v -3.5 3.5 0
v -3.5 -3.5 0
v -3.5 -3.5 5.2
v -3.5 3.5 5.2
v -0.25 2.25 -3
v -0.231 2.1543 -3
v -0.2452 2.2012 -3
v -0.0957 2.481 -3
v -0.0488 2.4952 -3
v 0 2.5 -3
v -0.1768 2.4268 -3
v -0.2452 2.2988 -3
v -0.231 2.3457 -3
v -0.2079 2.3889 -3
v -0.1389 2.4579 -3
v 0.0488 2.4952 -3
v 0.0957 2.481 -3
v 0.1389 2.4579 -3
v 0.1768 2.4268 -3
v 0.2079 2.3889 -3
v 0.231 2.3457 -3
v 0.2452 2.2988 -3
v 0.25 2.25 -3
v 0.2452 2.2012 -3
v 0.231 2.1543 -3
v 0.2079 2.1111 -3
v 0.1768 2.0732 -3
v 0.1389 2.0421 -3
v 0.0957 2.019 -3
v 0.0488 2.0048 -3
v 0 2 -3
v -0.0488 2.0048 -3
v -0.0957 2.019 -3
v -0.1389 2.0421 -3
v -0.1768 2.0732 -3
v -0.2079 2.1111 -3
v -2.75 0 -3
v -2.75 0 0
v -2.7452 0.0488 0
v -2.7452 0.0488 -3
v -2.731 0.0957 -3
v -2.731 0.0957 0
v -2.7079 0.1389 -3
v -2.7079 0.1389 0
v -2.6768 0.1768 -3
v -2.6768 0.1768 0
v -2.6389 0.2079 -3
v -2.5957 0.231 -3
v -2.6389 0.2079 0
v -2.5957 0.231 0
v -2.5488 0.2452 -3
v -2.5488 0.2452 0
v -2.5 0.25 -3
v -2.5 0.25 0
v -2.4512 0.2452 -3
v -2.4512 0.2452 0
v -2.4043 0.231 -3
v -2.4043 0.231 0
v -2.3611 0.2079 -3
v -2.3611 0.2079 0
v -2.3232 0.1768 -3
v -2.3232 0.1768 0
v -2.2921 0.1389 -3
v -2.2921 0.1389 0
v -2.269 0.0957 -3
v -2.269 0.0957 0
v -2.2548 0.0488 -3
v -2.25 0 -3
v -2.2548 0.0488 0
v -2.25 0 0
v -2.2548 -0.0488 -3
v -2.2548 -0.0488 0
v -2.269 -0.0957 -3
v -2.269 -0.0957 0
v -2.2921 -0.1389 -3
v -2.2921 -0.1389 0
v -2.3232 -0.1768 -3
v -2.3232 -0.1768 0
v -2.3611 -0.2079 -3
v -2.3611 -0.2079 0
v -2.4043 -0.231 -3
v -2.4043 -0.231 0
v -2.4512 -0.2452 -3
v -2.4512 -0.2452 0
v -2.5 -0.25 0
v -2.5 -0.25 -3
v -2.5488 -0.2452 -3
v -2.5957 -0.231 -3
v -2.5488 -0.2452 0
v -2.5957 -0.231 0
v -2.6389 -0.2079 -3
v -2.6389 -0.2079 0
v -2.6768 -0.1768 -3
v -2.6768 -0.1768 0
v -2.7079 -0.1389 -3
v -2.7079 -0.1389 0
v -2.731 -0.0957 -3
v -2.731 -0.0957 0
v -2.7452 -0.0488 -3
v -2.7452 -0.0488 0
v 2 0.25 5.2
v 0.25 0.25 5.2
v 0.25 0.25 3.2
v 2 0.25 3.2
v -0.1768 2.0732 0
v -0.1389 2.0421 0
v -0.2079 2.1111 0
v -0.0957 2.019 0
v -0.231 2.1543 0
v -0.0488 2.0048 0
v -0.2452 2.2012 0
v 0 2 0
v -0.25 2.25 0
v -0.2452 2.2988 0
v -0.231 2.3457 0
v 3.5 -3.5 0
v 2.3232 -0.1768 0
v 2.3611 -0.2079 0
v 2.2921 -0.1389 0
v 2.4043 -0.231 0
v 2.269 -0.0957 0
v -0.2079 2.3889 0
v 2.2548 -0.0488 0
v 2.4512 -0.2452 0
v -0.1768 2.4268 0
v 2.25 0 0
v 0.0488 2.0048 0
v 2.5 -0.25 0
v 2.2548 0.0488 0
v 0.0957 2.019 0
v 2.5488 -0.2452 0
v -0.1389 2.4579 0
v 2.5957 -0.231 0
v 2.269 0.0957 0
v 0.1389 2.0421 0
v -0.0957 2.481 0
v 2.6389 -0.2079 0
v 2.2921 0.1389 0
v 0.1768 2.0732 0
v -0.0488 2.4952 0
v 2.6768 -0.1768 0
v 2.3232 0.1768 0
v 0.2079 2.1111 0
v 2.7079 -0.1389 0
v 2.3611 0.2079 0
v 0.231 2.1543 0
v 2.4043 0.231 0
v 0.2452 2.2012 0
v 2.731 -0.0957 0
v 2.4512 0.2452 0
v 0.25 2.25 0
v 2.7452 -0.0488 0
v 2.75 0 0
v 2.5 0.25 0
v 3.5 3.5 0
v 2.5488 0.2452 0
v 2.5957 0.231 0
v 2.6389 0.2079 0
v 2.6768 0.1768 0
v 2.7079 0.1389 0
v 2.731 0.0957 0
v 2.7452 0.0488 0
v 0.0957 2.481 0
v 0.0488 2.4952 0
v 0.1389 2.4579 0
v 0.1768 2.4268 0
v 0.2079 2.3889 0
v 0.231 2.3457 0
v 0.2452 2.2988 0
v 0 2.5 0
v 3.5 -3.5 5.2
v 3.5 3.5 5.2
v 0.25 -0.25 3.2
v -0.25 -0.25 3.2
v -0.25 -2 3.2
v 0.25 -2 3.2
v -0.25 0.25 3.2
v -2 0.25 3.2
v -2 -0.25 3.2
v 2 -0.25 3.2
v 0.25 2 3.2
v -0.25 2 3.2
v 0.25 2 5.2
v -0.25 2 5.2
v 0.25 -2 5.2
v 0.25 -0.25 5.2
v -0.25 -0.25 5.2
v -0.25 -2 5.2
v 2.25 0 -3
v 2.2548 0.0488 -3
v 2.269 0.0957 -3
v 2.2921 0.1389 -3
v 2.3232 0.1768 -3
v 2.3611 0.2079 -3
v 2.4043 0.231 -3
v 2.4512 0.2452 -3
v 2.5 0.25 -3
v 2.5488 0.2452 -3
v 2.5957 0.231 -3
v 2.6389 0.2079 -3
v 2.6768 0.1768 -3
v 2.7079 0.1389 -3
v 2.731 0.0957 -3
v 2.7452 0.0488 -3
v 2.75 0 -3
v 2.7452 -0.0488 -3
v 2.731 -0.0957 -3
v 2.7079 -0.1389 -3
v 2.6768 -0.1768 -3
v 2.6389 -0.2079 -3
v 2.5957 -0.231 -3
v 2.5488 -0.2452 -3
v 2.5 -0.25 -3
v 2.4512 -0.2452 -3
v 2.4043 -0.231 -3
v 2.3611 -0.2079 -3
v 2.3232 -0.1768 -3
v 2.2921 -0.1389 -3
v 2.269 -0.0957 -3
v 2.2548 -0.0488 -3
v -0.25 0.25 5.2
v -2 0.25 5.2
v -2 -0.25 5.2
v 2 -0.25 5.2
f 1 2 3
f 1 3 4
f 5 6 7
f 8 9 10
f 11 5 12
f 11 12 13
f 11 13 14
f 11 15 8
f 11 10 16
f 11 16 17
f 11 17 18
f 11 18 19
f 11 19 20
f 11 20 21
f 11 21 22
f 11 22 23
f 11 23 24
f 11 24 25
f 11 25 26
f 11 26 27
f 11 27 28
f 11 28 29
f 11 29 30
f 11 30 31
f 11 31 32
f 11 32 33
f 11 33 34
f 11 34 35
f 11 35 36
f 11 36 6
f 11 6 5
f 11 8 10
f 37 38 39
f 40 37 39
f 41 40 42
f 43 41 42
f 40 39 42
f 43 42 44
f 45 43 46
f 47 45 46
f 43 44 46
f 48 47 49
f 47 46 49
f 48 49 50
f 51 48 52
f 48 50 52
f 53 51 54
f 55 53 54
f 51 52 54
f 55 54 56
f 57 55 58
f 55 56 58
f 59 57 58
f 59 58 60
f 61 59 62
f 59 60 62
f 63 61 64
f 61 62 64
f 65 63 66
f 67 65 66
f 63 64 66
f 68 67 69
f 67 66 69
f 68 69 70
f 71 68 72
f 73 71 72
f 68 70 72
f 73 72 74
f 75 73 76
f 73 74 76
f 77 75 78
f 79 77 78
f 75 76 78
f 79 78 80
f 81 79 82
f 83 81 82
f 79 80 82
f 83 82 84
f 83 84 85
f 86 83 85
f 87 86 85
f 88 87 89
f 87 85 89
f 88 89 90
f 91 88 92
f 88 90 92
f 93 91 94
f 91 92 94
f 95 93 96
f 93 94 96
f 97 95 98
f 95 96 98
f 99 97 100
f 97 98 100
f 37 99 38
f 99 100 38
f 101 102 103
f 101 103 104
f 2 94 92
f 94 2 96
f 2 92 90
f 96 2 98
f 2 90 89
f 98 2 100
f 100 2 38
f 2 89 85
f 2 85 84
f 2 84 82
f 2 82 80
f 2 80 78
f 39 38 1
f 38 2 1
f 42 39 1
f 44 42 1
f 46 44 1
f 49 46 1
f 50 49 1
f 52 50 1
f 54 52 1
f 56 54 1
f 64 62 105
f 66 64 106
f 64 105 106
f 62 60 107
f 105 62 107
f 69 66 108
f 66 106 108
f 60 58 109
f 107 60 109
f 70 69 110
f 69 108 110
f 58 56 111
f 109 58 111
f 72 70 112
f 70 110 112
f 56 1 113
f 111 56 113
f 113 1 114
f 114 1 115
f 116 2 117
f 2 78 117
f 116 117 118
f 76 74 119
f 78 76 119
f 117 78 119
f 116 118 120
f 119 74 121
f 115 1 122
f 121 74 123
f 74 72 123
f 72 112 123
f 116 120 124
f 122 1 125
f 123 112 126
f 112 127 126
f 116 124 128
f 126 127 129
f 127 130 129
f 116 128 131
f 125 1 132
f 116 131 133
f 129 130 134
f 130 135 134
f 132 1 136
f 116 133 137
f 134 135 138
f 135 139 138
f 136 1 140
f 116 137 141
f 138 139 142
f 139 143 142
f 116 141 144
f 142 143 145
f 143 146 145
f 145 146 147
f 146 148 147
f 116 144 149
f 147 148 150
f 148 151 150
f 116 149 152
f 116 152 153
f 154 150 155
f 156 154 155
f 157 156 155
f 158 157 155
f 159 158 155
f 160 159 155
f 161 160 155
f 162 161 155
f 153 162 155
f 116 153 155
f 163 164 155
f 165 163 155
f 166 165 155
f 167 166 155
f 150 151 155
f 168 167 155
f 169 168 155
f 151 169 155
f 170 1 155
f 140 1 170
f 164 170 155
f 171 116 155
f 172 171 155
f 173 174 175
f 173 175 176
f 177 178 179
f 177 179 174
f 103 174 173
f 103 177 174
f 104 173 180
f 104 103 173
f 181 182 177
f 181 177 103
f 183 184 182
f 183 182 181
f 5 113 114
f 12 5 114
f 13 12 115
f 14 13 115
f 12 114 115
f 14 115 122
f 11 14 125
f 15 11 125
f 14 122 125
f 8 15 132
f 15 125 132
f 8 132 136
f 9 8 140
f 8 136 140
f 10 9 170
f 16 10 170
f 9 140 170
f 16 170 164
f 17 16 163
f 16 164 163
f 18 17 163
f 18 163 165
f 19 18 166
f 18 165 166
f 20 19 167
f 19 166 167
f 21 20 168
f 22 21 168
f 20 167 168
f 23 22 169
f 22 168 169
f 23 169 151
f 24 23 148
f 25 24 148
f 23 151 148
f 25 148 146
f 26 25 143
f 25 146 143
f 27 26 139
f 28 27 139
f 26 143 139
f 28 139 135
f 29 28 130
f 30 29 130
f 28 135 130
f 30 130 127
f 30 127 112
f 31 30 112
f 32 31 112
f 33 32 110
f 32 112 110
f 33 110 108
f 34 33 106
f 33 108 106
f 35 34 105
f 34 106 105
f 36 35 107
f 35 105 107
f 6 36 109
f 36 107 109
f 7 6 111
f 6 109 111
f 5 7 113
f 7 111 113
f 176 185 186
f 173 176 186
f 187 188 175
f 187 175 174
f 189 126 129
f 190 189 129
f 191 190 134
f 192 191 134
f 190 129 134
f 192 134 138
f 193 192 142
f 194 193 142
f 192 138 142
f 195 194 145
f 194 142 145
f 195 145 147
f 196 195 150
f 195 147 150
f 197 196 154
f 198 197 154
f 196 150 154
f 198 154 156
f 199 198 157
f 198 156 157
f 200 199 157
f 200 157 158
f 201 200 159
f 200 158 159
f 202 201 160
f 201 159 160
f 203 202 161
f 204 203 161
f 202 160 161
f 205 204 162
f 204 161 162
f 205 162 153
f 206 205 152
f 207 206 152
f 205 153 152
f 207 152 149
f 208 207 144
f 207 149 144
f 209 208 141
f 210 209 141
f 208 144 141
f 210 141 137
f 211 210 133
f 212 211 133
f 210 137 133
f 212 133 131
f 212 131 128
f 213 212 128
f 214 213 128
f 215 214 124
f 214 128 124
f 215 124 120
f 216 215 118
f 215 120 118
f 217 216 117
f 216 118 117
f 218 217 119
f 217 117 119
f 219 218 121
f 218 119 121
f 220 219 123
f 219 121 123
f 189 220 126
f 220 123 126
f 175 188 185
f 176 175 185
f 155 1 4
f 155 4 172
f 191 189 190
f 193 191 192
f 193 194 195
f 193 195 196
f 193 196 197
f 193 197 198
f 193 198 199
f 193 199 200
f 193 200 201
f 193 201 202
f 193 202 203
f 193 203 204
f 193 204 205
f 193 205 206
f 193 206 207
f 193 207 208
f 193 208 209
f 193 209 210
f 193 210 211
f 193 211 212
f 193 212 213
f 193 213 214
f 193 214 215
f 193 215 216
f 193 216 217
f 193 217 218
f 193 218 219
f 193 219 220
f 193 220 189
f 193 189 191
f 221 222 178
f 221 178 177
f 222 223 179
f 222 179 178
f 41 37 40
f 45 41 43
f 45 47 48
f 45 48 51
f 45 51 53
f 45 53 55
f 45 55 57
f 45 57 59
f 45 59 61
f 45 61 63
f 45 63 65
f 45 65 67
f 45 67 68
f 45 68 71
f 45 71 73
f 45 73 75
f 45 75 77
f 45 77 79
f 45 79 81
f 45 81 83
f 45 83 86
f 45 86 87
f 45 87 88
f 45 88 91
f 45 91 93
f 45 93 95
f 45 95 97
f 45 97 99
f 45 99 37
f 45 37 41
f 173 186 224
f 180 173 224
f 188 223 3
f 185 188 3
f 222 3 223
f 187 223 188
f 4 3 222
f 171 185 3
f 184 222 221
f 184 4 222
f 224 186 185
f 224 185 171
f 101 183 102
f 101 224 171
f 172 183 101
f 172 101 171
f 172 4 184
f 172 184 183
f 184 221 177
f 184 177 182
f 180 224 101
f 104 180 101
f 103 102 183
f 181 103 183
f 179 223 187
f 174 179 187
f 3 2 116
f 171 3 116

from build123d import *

# Parameters (mm, degrees)
SKETCH1_W           = 7
SKETCH1_H           = 7
BOSS_EXTRUDE1_DEPTH = 5.2
SKETCH2_W           = 4
SKETCH2_H           = 0.5
SKETCH2_W_2         = 0.5
SKETCH2_H_2         = 4
CUT_EXTRUDE1_DEPTH  = 2
SKETCH3_R           = 0.25
BOSS_EXTRUDE2_DEPTH = 3


with BuildPart() as part:
    # Sketch1 → Boss-Extrude1 (new body)
    with BuildSketch(Plane.XY):
        Rectangle(SKETCH1_W, SKETCH1_H)
    extrude(amount=BOSS_EXTRUDE1_DEPTH)

    # Sketch2 → Cut-Extrude1 (cut)
    with BuildSketch(Plane.XY.offset(5.2)):
        Rectangle(SKETCH2_W, SKETCH2_H)
        Rectangle(SKETCH2_W_2, SKETCH2_H_2)
    extrude(amount=-CUT_EXTRUDE1_DEPTH, mode=Mode.SUBTRACT)

    # Sketch3 → Boss-Extrude2 (add)
    with BuildSketch(Plane(origin=(0, 0, 0), x_dir=(-1, 0, 0), z_dir=(0, 0, -1))):
        with Locations((0, 2.25)):
            Circle(SKETCH3_R)
        with Locations((2.5, 0)):
            Circle(SKETCH3_R)
        with Locations((-2.5, 0)):
            Circle(SKETCH3_R)
    extrude(amount=BOSS_EXTRUDE2_DEPTH)


solid = part.part
